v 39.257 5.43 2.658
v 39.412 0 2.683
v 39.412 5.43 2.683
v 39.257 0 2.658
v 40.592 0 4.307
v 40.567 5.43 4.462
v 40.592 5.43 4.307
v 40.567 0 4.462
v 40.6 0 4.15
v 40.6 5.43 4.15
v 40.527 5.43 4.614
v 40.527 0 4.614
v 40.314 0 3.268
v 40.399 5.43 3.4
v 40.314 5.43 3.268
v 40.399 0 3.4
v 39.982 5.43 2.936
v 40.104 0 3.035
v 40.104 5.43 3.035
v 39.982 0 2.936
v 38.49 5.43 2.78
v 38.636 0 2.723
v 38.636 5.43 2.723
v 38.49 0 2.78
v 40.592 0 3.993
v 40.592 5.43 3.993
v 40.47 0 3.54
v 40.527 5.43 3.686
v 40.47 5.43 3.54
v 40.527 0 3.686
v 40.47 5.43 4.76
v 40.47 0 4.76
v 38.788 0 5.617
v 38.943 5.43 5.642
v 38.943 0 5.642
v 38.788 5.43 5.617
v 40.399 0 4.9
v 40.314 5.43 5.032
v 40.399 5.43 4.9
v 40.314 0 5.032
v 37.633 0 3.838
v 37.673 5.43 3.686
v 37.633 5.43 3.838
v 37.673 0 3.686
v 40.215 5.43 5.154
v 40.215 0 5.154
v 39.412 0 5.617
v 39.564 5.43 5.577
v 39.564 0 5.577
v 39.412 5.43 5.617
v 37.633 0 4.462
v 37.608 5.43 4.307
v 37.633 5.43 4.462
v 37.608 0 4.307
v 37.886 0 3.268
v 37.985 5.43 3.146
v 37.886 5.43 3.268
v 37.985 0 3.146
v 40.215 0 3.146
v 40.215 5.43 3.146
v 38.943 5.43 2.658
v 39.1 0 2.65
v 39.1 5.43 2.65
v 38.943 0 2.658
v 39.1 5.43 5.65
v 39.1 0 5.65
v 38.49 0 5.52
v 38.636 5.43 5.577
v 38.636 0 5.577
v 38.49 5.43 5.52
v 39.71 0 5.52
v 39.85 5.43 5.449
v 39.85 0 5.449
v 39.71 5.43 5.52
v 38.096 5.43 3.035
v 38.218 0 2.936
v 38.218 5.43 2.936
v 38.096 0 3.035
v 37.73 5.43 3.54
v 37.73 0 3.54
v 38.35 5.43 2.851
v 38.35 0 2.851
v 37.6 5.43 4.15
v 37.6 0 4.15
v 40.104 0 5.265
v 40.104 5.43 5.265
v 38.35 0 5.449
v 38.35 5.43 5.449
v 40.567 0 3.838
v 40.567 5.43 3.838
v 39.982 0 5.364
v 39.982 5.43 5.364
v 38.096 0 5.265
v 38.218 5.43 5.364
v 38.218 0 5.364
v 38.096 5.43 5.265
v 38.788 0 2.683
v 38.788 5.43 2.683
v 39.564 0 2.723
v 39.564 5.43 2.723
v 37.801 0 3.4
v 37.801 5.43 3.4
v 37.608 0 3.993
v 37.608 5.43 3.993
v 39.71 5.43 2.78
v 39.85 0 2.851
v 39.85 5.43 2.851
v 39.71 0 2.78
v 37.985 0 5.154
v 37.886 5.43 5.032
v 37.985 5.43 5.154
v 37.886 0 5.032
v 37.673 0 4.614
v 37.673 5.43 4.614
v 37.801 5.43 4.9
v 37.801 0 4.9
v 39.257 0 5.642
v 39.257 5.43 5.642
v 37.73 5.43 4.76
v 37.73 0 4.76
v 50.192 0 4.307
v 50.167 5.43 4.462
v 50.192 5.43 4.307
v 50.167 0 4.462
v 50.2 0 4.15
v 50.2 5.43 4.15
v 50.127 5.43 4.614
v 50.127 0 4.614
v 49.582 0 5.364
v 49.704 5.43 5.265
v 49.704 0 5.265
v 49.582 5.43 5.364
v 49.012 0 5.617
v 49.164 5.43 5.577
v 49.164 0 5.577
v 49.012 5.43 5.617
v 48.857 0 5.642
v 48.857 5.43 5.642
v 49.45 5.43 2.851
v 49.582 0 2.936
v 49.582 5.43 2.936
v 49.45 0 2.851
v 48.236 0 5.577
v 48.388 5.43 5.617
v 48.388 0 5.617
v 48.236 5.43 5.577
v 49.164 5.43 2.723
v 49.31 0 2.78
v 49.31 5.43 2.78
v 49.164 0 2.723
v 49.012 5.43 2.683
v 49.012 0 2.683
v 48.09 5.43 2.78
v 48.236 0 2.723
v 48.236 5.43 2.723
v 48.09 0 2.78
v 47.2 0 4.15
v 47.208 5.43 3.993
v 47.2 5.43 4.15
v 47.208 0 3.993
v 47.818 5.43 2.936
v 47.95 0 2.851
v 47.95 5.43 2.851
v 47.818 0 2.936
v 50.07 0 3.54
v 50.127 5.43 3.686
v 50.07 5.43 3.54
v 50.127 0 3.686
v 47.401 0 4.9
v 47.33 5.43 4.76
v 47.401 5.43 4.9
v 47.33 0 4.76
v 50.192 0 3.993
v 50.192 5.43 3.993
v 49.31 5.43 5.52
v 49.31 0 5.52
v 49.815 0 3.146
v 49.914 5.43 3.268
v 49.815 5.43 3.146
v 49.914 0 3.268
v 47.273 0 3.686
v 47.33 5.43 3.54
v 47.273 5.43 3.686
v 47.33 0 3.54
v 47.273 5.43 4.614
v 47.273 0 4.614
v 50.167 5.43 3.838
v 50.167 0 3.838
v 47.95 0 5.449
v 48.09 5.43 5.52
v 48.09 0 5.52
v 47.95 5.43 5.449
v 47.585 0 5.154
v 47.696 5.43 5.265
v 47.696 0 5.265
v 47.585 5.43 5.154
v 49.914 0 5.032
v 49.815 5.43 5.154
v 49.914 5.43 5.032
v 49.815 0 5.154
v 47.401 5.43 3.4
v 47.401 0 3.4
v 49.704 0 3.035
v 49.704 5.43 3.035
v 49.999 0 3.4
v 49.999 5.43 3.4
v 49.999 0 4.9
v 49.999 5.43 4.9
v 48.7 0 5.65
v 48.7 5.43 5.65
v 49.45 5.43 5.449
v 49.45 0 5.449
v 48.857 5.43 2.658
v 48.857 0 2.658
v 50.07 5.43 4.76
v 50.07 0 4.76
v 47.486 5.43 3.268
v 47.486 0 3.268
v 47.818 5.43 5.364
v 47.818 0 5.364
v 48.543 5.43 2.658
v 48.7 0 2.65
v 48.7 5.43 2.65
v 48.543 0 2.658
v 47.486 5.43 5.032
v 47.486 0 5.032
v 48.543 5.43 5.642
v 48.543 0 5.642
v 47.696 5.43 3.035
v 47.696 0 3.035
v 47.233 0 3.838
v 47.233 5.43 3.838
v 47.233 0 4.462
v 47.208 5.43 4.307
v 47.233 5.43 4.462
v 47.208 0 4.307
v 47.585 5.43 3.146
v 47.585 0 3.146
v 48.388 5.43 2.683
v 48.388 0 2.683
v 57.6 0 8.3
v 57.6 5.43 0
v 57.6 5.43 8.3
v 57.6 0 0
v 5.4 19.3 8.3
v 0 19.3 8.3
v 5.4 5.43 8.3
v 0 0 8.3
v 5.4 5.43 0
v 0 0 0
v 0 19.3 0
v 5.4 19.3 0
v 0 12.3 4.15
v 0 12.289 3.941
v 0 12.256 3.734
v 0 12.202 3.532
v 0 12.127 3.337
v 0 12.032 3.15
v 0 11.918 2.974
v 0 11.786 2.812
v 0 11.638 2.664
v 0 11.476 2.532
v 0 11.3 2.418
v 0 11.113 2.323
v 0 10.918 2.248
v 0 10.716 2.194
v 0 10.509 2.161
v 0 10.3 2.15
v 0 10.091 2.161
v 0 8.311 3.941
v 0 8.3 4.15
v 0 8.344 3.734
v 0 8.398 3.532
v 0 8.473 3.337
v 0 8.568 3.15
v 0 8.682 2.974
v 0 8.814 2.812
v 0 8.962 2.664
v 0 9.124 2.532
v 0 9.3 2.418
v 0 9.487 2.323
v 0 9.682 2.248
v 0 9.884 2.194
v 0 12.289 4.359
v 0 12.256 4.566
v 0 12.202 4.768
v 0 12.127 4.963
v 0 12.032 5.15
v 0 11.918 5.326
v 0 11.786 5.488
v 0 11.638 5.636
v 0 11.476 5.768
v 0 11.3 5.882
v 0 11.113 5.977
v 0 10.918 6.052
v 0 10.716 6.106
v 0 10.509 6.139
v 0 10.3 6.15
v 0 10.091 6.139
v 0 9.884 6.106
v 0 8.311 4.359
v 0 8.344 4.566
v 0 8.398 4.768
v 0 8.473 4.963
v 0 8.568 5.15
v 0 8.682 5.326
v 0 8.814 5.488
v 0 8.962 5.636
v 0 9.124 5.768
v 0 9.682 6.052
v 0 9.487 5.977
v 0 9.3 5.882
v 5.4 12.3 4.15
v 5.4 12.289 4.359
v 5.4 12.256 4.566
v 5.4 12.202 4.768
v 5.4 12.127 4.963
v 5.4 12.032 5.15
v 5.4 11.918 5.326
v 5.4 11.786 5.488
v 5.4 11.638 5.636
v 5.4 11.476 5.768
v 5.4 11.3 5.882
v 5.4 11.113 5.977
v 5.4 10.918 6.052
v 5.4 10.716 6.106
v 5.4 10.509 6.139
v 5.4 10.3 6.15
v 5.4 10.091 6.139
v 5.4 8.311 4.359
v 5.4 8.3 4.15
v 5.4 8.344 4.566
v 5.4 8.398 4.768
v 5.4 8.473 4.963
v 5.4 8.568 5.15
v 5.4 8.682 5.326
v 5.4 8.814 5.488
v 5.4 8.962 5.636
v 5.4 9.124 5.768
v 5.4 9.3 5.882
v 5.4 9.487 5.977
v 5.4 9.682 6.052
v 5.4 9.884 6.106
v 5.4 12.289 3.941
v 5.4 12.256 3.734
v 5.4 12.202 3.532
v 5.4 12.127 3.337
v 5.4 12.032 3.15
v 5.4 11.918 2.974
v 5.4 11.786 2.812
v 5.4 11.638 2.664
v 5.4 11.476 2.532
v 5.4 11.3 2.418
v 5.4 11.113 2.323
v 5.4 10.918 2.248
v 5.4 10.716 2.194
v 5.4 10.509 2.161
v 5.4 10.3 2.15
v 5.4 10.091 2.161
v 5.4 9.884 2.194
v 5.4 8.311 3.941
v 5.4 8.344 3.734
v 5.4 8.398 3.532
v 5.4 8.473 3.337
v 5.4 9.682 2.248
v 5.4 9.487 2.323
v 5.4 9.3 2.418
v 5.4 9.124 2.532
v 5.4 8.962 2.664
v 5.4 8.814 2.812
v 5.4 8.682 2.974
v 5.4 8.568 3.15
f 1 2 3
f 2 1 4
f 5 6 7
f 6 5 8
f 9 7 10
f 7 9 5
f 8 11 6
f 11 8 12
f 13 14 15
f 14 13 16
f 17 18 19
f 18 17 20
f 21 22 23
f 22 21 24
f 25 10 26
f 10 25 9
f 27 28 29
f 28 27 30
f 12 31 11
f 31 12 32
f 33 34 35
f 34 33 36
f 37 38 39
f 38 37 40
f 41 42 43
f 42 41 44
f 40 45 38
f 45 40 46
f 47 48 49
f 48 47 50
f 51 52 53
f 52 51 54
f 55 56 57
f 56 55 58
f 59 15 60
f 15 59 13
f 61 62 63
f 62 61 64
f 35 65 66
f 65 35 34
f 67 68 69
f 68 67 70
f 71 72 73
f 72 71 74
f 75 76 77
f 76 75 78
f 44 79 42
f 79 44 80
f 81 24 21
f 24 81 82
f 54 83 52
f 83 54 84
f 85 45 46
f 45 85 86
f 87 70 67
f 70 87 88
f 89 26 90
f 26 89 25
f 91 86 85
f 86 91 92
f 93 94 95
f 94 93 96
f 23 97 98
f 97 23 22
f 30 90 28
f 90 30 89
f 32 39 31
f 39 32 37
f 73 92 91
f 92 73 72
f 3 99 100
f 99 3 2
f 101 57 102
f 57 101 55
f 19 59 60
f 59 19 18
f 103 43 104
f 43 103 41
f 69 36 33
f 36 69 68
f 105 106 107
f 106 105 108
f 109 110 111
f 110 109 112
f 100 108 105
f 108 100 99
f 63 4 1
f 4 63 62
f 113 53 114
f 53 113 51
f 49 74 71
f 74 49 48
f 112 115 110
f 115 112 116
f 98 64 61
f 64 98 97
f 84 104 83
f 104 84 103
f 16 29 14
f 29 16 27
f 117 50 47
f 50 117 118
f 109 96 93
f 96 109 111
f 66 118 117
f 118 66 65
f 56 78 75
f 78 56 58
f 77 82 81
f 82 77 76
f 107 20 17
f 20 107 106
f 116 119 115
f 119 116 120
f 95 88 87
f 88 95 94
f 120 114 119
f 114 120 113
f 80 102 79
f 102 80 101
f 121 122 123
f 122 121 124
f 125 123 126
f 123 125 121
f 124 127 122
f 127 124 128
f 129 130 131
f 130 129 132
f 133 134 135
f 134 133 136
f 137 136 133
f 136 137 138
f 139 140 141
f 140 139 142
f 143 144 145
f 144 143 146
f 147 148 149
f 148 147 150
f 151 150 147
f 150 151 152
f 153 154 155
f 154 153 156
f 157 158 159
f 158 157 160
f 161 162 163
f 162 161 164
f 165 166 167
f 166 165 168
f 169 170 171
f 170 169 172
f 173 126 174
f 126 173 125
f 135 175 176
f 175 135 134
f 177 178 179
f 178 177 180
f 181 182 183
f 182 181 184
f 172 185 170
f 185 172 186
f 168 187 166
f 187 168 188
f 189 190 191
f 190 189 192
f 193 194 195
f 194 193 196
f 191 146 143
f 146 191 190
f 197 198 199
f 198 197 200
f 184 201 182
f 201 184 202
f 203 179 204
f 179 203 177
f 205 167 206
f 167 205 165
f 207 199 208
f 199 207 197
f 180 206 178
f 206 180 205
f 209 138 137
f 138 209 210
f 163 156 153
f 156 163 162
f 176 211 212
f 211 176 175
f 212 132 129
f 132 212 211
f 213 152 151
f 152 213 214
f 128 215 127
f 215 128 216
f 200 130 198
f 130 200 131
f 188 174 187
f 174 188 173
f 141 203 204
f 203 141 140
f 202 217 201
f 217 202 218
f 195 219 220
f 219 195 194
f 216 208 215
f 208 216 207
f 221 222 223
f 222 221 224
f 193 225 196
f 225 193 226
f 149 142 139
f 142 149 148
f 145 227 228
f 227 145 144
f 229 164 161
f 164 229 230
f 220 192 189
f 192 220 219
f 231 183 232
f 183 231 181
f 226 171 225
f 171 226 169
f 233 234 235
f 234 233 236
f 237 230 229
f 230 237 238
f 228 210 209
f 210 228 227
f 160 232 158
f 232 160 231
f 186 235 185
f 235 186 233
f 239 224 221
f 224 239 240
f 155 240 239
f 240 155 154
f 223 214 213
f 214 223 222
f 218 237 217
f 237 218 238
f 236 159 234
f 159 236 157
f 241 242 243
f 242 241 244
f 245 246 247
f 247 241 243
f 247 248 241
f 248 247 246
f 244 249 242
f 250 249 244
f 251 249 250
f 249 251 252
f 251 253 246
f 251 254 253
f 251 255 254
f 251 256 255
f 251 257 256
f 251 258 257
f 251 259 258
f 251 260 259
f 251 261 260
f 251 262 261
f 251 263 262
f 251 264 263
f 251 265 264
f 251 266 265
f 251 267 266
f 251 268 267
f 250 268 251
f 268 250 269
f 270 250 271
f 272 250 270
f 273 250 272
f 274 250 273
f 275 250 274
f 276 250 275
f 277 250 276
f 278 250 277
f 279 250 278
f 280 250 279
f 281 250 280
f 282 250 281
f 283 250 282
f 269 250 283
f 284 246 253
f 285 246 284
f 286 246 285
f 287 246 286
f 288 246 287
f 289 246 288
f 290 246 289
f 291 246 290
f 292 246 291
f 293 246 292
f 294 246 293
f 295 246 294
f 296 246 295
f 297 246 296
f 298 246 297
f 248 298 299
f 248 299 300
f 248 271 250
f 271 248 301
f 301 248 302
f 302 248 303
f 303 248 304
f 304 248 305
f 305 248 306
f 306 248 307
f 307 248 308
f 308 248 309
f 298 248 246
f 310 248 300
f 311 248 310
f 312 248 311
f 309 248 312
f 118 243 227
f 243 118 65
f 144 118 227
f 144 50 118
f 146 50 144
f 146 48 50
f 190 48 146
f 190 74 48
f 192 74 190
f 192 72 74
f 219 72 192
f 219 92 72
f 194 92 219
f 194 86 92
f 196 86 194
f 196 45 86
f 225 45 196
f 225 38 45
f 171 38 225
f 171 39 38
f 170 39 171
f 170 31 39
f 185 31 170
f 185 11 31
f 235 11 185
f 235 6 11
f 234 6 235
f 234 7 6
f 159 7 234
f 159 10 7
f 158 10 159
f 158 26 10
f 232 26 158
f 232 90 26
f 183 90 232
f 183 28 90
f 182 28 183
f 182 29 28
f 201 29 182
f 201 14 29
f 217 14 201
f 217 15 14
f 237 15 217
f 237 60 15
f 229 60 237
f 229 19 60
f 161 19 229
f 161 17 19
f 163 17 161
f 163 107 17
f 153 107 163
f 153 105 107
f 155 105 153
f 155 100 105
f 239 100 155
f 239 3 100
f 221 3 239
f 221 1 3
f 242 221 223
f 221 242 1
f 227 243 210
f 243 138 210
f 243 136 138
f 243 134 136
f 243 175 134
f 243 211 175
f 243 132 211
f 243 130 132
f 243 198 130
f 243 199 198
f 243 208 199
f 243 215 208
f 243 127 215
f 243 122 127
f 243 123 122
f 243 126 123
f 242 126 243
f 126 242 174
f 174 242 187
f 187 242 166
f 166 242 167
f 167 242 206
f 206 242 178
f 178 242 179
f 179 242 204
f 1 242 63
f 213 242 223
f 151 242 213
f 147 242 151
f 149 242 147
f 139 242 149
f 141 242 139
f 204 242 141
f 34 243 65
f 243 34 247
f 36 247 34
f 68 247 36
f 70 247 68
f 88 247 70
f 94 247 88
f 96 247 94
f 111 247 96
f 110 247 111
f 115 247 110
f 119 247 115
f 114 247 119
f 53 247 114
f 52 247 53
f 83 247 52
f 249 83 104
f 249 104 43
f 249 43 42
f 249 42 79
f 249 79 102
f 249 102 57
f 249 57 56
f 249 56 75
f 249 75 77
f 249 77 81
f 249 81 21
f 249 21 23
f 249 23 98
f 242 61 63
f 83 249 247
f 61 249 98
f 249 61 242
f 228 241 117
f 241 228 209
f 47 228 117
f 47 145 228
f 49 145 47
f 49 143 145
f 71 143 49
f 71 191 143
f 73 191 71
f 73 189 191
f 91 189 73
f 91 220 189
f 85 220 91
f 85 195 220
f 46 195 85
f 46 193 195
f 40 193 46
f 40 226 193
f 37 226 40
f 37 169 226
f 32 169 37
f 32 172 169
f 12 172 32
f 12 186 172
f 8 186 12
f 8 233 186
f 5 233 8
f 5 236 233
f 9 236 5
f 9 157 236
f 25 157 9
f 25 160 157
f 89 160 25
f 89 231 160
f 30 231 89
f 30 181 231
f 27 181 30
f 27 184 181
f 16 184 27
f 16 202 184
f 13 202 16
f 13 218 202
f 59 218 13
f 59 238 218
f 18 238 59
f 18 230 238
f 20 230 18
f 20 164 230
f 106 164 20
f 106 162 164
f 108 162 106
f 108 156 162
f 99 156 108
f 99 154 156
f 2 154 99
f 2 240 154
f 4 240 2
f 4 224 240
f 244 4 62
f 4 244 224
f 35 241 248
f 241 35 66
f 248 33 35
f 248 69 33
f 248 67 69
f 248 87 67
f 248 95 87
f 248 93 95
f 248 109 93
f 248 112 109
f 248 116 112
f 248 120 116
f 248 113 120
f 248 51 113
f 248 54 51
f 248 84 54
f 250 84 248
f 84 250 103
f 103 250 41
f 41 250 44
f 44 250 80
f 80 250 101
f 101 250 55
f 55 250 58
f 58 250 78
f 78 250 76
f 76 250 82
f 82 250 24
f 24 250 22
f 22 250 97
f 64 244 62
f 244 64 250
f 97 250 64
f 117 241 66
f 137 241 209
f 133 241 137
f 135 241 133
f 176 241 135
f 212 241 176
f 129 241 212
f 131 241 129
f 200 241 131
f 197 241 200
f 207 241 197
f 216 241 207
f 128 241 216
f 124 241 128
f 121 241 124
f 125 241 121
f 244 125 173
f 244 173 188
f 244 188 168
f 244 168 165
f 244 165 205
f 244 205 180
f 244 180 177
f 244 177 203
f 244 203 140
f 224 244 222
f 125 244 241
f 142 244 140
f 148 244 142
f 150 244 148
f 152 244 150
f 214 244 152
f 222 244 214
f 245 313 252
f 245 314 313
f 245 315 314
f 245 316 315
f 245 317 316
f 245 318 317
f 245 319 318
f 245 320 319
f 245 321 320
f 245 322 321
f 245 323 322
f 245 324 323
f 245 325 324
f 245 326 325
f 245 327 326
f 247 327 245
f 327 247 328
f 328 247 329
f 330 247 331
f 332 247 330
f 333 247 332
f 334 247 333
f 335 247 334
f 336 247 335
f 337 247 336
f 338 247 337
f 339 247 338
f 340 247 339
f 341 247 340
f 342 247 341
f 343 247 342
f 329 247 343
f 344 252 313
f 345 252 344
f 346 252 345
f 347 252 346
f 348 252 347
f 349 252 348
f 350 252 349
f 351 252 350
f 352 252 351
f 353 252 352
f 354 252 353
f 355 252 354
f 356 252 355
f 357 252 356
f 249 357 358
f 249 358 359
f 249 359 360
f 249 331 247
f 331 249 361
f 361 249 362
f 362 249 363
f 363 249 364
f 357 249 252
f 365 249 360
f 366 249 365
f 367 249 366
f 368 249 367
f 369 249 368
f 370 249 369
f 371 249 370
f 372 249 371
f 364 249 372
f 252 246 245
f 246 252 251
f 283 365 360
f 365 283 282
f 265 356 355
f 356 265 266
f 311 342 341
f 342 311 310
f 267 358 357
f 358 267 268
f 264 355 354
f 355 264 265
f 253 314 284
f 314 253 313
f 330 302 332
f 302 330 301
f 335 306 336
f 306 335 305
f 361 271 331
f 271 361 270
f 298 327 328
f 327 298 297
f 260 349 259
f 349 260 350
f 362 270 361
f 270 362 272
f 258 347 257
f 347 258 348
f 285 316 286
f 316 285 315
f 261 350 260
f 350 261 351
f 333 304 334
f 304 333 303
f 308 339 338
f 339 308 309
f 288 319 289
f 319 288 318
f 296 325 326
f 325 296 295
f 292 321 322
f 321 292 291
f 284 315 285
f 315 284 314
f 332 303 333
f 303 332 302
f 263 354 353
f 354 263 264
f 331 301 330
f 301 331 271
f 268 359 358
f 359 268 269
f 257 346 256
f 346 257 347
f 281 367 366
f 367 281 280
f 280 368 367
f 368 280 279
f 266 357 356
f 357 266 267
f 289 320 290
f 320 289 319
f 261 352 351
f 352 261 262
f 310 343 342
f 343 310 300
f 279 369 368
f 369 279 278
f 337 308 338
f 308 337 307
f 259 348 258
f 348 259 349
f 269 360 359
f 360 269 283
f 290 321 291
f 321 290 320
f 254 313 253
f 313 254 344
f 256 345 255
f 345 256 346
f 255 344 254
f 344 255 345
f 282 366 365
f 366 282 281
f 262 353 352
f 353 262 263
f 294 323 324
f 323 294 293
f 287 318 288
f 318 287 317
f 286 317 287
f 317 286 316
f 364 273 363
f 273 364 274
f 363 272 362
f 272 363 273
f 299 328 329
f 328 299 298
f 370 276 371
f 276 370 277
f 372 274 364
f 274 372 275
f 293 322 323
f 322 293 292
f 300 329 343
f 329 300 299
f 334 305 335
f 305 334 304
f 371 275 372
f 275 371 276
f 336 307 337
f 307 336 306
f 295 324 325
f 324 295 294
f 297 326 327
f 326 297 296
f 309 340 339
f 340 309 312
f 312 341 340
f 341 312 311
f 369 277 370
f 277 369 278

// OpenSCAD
// Z Axis End Stop for a Sinhokey Prusa I4

$fn=60;

longLength=57.6;
shortLength=19.3;
height=8.3;
thickeness=5.43;
smallDiameter=3.0;
largeDiameter=4.0;

difference() {
    cube(size=[longLength,thickeness,height]);
      rotate([90,0,0]){
        translate( [39.1, height/2,-6])
            cylinder(r=smallDiameter/2,h=7);
        translate( [48.7,height/2,-6])
            cylinder(r=smallDiameter/2,h=7);
          
        }
}

difference (){
    cube(size=[5.4,shortLength,8.3]);
      rotate([0,90,0]){
        translate( [-height/2, 8.3+largeDiameter/2,-1])
            cylinder(r=largeDiameter/2,h=7);
      }
}
